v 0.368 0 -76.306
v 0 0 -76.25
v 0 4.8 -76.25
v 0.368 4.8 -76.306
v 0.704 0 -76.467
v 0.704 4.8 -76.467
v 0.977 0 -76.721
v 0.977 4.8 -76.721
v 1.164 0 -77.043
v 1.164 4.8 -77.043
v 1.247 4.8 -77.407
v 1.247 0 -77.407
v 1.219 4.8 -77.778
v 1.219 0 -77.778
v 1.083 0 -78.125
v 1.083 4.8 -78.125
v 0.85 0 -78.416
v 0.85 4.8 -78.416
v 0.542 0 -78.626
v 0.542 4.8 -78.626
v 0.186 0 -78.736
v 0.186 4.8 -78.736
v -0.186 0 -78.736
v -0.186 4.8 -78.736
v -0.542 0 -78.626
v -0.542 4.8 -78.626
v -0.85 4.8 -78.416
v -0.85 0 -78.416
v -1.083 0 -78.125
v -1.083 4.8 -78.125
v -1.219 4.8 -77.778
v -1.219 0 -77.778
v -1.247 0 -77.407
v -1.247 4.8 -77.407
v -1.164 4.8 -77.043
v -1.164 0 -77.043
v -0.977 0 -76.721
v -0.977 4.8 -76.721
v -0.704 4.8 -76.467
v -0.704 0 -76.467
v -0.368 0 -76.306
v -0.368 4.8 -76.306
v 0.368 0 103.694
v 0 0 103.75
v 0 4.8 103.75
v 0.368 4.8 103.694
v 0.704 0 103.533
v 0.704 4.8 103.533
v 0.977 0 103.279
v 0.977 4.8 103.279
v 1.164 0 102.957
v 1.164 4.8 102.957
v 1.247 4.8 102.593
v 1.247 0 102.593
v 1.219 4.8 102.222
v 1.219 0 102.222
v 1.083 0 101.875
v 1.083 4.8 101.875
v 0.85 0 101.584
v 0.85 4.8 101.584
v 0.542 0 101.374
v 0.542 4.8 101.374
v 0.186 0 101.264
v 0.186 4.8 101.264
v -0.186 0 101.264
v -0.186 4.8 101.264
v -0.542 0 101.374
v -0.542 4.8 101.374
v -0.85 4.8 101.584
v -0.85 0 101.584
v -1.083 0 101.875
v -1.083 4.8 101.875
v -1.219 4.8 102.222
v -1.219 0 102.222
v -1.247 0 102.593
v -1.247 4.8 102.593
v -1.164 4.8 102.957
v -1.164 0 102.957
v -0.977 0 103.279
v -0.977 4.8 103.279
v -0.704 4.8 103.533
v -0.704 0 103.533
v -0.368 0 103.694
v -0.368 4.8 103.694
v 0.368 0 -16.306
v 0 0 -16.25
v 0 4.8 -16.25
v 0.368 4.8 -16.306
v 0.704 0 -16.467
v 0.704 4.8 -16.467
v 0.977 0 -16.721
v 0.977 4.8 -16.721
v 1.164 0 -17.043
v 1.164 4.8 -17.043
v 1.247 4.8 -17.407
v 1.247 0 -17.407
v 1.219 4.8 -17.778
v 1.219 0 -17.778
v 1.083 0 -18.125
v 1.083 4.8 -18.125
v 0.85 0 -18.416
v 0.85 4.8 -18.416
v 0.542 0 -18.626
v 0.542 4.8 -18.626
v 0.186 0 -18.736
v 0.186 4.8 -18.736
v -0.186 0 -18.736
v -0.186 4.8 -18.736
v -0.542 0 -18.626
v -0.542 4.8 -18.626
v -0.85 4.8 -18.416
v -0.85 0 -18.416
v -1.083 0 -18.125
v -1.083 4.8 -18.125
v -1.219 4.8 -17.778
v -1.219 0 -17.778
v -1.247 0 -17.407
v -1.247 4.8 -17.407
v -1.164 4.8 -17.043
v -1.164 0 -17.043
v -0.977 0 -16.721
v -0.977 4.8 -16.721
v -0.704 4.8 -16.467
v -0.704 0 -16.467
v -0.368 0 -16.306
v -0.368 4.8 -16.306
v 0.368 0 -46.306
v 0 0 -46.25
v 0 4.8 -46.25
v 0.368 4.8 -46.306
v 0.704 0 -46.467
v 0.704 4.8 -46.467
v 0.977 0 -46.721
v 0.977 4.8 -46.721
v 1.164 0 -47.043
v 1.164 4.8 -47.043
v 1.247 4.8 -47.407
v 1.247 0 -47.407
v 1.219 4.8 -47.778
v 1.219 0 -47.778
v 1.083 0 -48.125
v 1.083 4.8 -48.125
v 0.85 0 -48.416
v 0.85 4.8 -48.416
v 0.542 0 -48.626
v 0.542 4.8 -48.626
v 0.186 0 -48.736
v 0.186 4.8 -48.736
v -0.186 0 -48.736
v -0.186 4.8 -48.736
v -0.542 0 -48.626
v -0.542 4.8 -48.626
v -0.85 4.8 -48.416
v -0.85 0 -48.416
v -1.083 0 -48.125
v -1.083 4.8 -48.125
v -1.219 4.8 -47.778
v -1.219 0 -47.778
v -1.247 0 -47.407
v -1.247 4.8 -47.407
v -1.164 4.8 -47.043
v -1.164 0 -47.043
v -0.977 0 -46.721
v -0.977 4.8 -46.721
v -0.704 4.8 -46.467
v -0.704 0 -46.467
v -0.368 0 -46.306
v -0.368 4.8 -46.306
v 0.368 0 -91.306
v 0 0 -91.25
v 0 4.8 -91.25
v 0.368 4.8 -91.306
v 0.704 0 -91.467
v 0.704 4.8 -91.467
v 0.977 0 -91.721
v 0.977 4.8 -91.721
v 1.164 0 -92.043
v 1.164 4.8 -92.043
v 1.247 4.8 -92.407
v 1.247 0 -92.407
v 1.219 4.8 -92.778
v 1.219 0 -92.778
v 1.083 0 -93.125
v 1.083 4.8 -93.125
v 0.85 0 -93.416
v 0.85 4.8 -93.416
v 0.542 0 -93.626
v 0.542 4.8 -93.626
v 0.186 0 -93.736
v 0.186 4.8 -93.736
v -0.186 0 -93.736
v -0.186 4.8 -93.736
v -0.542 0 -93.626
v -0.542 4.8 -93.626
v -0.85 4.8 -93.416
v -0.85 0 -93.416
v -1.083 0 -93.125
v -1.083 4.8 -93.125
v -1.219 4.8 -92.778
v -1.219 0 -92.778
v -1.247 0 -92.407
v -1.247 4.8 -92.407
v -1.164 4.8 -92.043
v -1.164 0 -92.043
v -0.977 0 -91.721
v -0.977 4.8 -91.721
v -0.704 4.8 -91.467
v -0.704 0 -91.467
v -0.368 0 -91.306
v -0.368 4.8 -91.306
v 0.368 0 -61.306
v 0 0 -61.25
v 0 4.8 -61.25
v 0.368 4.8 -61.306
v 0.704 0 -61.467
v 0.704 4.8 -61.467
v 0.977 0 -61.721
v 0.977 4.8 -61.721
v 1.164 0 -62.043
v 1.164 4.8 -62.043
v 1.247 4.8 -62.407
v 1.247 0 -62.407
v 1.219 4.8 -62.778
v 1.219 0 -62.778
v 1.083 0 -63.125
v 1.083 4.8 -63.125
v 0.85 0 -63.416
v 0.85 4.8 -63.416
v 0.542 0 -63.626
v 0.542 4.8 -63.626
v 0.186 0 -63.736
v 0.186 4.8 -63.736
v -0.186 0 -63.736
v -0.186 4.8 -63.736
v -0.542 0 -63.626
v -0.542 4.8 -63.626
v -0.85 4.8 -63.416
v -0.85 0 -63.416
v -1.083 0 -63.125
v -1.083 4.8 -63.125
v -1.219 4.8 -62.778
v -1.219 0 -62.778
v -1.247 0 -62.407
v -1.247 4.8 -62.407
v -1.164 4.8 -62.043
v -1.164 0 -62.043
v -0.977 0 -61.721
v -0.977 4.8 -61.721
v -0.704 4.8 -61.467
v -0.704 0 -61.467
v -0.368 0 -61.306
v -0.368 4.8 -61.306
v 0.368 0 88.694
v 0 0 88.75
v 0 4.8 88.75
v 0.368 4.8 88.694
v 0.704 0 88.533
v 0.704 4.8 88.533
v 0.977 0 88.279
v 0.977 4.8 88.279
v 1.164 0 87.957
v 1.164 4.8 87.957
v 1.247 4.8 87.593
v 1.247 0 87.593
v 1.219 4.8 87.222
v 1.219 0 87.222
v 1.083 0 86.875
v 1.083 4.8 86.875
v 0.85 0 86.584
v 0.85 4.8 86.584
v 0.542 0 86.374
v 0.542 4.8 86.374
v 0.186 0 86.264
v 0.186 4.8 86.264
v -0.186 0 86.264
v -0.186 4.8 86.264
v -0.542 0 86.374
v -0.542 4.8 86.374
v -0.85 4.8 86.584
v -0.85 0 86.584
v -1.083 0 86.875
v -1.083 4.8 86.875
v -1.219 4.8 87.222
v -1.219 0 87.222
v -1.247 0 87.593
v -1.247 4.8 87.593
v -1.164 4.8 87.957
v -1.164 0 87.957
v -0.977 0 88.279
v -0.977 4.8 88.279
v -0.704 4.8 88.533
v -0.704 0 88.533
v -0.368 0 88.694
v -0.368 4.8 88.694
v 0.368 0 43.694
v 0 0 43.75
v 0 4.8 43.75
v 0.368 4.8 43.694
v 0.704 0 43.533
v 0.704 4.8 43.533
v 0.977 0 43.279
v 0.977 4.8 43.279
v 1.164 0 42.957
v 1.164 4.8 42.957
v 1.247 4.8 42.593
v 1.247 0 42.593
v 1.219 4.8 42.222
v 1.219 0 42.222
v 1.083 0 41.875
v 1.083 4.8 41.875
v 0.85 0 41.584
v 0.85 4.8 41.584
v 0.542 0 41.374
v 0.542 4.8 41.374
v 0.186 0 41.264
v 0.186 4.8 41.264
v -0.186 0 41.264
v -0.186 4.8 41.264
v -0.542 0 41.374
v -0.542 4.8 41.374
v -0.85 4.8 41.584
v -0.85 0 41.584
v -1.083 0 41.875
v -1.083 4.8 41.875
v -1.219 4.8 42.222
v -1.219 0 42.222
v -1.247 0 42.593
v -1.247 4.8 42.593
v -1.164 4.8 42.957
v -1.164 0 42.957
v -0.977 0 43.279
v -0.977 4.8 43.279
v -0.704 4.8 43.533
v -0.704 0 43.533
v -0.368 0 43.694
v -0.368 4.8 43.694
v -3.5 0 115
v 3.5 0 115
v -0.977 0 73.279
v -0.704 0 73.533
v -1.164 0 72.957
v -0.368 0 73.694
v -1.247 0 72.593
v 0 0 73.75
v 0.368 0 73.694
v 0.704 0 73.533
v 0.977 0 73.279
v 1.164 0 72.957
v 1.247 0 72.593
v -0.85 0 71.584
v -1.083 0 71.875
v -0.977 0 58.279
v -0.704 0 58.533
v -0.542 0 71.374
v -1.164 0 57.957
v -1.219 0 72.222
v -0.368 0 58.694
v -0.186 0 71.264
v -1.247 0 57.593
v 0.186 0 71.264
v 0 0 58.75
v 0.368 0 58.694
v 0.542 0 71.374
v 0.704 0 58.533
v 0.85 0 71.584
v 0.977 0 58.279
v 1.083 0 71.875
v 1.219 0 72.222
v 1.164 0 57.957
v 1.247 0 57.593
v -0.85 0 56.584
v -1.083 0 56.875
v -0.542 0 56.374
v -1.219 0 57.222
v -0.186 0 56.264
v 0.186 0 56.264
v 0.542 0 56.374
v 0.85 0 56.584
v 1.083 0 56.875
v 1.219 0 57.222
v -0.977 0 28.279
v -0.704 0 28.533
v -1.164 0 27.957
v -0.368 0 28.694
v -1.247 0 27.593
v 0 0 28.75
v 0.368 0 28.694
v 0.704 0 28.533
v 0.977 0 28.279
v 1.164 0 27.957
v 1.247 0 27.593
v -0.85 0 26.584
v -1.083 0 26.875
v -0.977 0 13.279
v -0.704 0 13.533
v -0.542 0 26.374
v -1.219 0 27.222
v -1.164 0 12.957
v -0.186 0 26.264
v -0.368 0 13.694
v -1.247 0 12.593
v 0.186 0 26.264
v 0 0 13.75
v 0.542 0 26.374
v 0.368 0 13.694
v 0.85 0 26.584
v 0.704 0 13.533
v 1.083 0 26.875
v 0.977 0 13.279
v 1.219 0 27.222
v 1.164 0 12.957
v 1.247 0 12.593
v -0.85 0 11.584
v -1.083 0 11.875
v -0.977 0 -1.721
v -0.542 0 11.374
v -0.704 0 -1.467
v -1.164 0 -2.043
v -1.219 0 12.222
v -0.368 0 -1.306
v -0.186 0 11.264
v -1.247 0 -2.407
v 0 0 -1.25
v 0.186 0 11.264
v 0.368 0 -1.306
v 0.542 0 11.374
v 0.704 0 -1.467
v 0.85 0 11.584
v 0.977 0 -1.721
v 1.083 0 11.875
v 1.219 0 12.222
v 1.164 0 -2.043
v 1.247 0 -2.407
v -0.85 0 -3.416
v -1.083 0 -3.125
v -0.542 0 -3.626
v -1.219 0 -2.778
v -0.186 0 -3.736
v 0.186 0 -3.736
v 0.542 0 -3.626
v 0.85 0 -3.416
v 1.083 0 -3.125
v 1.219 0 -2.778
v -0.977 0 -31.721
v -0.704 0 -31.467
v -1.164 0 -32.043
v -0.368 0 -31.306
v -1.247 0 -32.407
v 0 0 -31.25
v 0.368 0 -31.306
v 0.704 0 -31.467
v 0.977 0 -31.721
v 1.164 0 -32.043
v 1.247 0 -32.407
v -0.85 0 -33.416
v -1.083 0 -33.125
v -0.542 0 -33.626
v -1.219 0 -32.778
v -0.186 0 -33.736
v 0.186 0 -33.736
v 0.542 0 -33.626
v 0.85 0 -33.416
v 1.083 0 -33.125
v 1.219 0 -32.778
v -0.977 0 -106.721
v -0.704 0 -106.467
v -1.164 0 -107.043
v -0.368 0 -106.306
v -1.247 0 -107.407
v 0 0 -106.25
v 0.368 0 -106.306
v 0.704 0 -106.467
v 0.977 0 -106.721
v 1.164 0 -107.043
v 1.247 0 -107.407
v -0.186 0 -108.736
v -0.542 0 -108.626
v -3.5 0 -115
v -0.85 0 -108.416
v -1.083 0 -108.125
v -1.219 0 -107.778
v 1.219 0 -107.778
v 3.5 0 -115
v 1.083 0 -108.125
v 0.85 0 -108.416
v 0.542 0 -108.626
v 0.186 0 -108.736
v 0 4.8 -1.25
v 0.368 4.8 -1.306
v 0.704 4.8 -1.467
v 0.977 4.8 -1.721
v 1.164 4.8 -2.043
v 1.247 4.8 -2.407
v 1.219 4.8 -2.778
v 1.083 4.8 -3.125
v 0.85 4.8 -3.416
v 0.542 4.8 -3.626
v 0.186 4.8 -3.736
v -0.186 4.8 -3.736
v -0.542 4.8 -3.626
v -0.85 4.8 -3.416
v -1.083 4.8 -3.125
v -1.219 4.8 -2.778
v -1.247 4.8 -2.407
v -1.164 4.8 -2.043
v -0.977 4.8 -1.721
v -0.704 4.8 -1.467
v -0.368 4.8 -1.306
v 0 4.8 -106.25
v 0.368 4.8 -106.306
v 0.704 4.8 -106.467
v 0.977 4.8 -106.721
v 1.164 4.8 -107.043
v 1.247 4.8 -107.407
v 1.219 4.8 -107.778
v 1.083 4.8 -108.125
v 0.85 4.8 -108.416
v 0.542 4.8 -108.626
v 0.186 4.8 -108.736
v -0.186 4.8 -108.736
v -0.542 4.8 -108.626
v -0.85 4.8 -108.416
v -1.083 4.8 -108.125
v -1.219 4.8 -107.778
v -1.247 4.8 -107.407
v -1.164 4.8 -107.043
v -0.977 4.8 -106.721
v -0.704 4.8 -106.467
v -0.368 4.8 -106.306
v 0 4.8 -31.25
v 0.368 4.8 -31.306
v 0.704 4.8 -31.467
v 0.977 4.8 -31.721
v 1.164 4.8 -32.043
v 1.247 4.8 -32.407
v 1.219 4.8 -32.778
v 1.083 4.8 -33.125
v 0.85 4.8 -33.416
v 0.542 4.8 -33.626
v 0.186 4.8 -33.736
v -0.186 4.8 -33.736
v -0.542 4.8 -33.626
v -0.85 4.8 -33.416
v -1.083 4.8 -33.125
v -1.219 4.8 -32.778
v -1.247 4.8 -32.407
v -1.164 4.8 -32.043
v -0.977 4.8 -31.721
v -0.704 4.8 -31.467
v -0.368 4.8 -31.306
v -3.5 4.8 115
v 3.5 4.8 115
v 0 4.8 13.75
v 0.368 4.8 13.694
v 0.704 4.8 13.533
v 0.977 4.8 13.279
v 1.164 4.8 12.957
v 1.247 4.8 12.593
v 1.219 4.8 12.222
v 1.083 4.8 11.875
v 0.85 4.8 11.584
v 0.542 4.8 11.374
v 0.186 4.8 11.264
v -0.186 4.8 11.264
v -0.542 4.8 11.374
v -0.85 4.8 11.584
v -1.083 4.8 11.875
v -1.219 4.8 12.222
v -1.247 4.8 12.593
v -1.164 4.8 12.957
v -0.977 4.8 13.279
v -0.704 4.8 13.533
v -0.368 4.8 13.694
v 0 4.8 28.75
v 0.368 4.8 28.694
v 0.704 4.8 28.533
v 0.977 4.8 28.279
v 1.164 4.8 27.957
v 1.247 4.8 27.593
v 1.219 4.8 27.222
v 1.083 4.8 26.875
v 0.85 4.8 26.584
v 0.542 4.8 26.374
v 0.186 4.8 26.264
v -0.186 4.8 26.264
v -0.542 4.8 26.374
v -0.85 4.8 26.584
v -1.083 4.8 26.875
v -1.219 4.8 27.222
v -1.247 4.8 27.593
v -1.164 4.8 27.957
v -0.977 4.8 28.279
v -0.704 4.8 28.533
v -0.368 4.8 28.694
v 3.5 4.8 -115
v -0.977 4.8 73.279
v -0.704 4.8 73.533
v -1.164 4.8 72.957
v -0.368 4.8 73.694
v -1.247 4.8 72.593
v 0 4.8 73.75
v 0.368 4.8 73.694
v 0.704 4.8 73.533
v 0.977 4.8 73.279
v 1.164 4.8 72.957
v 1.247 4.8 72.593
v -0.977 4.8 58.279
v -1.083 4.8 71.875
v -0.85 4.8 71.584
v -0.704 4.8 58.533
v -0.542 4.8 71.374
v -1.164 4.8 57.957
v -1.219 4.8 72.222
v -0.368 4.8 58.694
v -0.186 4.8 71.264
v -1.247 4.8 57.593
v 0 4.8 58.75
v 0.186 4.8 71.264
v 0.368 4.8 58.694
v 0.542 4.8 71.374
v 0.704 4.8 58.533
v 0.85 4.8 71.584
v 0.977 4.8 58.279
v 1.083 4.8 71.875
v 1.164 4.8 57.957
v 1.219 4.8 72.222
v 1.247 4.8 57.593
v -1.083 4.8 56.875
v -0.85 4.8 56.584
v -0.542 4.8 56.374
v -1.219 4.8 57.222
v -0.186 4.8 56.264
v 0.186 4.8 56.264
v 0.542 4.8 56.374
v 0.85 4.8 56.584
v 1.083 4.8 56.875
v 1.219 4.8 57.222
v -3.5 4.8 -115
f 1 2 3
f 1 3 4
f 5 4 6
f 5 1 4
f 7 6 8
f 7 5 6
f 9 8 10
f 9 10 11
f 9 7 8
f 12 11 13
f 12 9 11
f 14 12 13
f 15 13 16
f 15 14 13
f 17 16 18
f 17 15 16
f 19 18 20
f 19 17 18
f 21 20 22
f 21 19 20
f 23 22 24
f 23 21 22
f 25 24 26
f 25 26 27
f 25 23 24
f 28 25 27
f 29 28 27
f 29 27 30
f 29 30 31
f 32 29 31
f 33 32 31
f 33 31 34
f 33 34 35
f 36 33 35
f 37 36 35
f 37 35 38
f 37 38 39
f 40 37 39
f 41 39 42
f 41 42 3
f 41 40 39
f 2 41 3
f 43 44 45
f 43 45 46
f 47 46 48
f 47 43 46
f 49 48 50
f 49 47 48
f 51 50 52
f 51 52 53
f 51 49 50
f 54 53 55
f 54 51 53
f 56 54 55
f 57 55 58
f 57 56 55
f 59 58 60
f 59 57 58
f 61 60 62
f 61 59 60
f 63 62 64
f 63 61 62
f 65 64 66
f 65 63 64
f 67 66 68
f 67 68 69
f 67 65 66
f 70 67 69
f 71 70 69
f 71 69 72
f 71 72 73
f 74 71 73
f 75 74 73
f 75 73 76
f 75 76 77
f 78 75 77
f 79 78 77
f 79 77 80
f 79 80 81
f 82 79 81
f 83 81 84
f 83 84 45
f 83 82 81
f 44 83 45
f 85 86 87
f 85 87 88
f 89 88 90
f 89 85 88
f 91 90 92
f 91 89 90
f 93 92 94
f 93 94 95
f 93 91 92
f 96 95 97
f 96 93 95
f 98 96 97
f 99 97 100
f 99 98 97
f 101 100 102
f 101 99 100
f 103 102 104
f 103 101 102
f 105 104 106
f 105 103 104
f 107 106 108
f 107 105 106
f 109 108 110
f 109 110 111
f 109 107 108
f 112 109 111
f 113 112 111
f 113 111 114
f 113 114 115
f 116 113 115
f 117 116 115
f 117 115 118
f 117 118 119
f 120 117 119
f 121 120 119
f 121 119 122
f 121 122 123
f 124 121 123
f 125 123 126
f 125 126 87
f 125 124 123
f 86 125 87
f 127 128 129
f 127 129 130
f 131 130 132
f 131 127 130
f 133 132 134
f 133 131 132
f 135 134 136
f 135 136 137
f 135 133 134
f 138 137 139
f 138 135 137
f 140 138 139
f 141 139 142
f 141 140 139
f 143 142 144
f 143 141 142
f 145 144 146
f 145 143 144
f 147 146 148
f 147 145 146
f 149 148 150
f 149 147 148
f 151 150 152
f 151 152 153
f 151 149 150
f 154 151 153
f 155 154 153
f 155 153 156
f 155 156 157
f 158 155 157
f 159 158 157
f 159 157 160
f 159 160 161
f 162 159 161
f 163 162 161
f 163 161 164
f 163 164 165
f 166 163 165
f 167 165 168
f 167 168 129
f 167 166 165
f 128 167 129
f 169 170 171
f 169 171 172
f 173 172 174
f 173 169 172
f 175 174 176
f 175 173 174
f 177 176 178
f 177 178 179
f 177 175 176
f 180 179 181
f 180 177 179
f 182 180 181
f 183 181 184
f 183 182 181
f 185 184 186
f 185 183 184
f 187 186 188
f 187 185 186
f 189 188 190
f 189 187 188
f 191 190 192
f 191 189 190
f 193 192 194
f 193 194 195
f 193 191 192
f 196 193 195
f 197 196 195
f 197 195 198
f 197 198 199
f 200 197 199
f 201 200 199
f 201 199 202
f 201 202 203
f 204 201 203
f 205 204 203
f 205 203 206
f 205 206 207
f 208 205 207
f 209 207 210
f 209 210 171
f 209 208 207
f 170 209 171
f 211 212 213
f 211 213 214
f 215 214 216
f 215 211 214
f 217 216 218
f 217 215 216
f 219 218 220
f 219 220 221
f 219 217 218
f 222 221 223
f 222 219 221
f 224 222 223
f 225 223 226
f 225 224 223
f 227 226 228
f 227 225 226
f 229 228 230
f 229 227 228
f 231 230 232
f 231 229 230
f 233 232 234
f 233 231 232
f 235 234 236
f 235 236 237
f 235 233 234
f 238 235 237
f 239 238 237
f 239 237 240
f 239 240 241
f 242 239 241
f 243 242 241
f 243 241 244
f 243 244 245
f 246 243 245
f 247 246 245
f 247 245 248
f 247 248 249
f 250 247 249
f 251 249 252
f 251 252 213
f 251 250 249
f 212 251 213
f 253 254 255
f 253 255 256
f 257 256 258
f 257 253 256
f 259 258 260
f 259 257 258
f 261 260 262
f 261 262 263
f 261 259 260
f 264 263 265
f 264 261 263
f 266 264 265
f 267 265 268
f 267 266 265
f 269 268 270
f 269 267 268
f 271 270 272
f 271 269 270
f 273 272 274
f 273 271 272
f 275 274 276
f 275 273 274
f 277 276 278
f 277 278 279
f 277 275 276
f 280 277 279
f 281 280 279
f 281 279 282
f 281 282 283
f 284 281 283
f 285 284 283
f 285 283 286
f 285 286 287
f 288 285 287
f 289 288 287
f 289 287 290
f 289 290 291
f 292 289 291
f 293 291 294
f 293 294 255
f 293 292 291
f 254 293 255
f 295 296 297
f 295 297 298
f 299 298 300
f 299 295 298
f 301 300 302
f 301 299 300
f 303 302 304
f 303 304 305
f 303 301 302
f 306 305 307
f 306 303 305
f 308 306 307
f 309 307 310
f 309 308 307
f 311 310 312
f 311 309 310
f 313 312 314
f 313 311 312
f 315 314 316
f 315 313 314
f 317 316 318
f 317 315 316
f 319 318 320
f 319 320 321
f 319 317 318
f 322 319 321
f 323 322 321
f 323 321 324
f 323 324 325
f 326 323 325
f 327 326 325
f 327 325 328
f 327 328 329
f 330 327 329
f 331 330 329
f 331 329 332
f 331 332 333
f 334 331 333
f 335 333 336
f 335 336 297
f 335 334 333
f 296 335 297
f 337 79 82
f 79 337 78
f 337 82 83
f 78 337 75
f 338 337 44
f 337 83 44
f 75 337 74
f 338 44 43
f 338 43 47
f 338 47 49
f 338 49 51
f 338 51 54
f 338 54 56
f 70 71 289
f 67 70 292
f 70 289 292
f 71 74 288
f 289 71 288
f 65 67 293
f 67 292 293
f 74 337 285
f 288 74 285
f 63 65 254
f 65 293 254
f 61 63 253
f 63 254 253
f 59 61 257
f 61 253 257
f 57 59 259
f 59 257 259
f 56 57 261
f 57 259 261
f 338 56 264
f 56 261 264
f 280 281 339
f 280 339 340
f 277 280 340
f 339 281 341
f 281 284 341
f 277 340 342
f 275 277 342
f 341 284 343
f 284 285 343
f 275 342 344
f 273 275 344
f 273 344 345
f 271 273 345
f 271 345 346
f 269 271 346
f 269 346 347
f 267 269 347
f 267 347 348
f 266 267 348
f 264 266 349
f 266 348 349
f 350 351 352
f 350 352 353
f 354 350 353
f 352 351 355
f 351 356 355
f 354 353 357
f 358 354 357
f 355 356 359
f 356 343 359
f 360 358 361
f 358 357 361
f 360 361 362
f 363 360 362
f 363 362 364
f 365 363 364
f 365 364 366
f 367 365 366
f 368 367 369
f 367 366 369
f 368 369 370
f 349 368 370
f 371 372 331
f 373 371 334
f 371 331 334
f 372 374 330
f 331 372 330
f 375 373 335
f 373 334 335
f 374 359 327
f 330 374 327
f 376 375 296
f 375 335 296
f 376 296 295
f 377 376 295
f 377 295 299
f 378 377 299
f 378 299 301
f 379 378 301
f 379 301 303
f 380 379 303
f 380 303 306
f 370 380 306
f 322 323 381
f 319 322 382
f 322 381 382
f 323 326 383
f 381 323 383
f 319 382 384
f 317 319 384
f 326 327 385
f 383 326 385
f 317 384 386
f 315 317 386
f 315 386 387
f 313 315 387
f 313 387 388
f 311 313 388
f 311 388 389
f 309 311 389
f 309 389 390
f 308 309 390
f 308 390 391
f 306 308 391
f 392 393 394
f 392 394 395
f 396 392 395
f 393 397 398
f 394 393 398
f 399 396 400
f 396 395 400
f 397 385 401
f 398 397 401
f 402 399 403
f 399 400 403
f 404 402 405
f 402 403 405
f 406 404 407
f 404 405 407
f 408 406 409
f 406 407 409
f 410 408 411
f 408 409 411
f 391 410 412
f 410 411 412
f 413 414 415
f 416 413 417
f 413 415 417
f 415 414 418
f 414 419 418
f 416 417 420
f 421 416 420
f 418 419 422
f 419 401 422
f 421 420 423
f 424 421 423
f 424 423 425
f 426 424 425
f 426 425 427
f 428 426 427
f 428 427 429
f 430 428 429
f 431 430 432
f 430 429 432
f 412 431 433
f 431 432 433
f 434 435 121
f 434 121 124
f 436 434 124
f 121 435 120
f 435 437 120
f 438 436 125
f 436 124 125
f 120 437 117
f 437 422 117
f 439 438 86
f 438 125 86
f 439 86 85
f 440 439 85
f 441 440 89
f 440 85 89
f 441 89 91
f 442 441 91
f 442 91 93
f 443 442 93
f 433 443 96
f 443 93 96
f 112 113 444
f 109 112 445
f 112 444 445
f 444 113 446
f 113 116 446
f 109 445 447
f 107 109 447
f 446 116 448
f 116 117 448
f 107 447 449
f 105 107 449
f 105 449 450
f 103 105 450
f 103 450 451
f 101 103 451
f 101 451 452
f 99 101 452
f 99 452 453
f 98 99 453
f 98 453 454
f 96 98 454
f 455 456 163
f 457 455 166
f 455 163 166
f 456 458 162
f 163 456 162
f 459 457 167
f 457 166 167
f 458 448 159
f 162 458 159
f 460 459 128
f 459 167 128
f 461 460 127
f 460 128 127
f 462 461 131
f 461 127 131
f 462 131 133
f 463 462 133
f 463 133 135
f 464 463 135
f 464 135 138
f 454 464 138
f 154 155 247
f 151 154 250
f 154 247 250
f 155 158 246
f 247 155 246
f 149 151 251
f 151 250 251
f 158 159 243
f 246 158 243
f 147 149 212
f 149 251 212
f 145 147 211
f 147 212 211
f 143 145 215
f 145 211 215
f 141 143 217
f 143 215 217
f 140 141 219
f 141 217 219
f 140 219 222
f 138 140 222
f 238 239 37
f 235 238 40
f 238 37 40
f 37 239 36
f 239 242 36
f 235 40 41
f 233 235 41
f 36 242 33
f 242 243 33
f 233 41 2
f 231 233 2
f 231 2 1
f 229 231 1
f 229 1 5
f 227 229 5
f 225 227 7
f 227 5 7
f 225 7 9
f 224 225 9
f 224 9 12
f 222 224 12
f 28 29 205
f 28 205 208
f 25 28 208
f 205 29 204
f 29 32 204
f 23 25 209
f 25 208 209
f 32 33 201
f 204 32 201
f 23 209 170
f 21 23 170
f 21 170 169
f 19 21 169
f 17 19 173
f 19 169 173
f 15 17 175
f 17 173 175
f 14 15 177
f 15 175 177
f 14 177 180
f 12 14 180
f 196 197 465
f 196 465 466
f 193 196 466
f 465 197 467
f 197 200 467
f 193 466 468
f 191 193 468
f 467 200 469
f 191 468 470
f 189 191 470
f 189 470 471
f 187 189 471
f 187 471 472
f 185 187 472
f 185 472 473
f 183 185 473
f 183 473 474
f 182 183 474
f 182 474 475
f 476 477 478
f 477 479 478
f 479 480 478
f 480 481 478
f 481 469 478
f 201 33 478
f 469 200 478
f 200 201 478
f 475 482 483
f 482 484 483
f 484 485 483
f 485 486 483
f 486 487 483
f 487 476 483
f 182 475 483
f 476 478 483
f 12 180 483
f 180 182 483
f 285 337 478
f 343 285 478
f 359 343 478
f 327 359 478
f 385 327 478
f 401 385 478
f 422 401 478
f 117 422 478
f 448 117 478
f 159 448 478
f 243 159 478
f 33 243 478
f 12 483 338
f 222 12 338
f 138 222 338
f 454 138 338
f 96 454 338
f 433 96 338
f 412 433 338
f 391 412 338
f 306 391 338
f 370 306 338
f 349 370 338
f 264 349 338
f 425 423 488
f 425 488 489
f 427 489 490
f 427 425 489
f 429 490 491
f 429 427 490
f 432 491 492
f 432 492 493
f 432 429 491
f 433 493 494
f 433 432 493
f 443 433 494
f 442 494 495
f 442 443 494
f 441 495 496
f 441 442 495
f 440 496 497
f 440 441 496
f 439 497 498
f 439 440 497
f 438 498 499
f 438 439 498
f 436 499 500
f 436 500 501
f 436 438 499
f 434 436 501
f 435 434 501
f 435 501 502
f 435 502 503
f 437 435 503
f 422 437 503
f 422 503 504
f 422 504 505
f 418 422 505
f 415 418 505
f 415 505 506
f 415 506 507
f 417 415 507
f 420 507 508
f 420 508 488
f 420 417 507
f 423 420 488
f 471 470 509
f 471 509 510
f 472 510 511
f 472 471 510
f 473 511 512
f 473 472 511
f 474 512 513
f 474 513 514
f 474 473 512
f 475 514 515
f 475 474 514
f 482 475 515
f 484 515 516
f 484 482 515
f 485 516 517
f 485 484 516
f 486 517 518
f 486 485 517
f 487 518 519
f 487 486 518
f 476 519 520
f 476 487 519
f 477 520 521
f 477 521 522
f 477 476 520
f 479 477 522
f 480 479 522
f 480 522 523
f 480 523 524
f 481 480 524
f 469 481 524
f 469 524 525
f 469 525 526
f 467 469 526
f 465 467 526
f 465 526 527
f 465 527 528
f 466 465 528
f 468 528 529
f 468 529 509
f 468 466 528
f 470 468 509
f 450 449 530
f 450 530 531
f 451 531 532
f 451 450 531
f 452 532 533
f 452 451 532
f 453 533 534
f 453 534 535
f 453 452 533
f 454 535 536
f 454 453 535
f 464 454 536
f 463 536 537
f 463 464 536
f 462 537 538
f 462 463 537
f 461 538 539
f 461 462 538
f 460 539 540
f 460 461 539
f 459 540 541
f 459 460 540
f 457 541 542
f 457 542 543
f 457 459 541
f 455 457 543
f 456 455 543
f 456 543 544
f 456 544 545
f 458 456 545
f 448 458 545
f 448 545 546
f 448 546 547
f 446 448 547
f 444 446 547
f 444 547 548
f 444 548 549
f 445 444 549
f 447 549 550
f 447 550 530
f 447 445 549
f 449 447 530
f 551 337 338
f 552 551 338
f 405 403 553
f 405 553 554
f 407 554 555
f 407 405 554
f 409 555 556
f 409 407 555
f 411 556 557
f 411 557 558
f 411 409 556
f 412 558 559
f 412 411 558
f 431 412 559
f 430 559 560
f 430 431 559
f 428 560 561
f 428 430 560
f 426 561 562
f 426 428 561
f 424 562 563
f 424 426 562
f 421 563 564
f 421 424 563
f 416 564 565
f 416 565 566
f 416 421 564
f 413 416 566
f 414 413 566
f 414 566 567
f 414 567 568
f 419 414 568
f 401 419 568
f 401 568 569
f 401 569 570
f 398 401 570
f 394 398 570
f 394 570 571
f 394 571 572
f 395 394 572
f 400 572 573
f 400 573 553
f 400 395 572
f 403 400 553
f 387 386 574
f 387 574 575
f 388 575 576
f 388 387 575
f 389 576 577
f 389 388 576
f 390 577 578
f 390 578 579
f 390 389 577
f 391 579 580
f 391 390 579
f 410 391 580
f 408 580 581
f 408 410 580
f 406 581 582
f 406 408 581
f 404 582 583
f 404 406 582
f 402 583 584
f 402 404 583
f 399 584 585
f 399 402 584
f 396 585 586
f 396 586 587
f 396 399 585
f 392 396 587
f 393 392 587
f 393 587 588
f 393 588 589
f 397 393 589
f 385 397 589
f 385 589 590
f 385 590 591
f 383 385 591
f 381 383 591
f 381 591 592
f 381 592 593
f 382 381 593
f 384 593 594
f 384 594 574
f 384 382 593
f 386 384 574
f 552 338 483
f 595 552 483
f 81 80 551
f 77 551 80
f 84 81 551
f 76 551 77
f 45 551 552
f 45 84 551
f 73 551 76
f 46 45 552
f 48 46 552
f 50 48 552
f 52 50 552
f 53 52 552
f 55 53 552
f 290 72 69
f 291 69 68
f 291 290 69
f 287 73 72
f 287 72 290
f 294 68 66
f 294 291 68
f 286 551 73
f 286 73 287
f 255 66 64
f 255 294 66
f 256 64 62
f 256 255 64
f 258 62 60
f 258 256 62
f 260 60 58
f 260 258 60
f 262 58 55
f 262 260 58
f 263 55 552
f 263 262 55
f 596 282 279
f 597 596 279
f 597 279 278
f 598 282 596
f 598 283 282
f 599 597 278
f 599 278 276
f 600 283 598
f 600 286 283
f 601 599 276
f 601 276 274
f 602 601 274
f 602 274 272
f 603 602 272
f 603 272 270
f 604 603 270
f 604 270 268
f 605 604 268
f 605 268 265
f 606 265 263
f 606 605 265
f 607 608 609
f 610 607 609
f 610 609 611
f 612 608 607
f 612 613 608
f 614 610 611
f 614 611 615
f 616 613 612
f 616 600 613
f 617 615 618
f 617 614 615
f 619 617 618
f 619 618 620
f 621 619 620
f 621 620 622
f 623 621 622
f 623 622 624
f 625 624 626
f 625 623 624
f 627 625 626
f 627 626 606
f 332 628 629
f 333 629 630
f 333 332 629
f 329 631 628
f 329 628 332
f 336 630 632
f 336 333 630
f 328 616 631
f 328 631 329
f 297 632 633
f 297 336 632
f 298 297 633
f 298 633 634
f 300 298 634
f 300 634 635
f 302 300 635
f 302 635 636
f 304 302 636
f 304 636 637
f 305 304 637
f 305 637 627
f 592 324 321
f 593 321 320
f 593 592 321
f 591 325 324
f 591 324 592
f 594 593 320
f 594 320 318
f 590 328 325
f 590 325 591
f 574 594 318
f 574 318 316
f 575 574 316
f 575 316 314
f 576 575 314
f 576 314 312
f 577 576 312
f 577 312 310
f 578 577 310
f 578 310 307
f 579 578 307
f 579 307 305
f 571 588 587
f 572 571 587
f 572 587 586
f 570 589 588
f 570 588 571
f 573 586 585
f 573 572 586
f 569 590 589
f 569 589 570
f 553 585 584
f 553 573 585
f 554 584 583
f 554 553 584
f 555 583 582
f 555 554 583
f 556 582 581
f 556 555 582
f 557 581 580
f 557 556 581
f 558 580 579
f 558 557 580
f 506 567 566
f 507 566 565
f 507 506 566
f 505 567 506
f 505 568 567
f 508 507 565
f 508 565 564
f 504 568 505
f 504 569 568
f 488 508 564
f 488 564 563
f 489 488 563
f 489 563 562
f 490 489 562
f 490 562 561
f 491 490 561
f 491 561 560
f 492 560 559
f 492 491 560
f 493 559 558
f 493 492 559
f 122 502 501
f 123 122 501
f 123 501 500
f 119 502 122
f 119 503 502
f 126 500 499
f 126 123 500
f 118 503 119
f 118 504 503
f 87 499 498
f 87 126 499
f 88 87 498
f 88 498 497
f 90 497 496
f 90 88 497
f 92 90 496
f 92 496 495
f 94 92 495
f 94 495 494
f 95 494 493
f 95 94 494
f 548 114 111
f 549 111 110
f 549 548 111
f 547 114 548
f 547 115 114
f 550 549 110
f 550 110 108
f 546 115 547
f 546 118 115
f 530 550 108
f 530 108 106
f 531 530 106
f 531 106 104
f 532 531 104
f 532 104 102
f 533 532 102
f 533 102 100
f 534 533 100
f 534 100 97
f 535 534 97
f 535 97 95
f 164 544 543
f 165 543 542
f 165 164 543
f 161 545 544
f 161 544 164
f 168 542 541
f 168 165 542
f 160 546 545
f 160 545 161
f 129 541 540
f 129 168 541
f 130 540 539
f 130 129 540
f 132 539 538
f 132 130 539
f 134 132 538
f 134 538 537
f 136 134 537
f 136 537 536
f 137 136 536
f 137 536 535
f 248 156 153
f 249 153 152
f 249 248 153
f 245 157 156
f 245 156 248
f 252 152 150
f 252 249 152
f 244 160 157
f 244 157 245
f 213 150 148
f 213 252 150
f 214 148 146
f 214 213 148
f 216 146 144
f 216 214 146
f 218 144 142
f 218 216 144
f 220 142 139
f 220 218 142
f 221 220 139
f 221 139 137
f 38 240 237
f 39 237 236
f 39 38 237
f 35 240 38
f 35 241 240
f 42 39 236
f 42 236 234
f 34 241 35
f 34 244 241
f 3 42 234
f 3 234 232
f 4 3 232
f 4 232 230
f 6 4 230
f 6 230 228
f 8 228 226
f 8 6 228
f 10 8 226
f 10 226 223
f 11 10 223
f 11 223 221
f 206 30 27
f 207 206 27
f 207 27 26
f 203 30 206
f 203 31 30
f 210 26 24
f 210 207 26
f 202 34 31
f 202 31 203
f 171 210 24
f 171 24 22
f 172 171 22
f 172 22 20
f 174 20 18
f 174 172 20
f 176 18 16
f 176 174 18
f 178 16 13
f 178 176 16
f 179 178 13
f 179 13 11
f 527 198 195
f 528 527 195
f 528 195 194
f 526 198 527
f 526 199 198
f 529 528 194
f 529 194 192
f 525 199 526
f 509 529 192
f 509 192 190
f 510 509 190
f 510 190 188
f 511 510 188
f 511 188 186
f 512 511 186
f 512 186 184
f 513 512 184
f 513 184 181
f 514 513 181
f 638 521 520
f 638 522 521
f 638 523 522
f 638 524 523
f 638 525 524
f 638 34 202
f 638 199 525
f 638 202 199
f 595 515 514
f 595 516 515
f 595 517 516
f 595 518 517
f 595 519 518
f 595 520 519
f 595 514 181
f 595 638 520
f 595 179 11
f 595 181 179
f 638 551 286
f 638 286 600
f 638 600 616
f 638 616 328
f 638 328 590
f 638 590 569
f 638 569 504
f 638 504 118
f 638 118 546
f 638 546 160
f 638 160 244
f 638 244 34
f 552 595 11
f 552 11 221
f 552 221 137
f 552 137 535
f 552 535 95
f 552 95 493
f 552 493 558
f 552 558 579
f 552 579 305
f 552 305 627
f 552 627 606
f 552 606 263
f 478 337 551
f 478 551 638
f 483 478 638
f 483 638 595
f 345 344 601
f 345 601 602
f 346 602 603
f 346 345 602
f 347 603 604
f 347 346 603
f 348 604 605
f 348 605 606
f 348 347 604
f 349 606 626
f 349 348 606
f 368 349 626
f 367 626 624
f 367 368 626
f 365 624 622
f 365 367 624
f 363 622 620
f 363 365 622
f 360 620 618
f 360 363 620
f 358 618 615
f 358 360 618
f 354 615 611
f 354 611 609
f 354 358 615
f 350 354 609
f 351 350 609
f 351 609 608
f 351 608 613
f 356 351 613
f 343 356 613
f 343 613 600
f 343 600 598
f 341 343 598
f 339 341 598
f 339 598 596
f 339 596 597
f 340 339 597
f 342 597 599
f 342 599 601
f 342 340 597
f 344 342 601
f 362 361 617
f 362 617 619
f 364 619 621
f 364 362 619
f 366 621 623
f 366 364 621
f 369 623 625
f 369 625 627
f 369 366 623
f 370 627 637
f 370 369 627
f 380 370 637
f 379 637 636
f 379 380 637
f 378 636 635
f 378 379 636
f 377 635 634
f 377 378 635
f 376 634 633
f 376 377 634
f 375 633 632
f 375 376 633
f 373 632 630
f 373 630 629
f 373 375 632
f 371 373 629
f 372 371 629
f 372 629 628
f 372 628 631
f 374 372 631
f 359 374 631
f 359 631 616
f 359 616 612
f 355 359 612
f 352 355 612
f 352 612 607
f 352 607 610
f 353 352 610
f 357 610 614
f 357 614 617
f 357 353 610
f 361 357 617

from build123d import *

# Parameters (mm, degrees)
SKETCH_1_W      = 7
SKETCH_1_H      = 230
SKETCH_1_R      = 1.25
EXTRUDE_1_DEPTH = 4.8


with BuildPart() as part:
    # 草图1 → 凸台-拉伸1 (new body)
    with BuildSketch(Plane(origin=(0, 0, 0), x_dir=(1, 0, 0), z_dir=(0, 1, 0))):
        Rectangle(SKETCH_1_W, SKETCH_1_H)
        with Locations(Location((0, 107.5, 0), (0, 0, 270))):
            Circle(SKETCH_1_R, mode=Mode.SUBTRACT)
        with Locations(Location((0, 92.5, 0), (0, 0, 270))):
            Circle(SKETCH_1_R, mode=Mode.SUBTRACT)
        with Locations(Location((0, 77.5, 0), (0, 0, 270))):
            Circle(SKETCH_1_R, mode=Mode.SUBTRACT)
        with Locations(Location((0, 62.5, 0), (0, 0, 270))):
            Circle(SKETCH_1_R, mode=Mode.SUBTRACT)
        with Locations(Location((0, 47.5, 0), (0, 0, 270))):
            Circle(SKETCH_1_R, mode=Mode.SUBTRACT)
        with Locations(Location((0, 32.5, 0), (0, 0, 270))):
            Circle(SKETCH_1_R, mode=Mode.SUBTRACT)
        with Locations(Location((0, 17.5, 0), (0, 0, 270))):
            Circle(SKETCH_1_R, mode=Mode.SUBTRACT)
        with Locations(Location((0, 2.5, 0), (0, 0, 270))):
            Circle(SKETCH_1_R, mode=Mode.SUBTRACT)
        with Locations(Location((0, -12.5, 0), (0, 0, 270))):
            Circle(SKETCH_1_R, mode=Mode.SUBTRACT)
        with Locations(Location((0, -27.5, 0), (0, 0, 270))):
            Circle(SKETCH_1_R, mode=Mode.SUBTRACT)
        with Locations(Location((0, -42.5, 0), (0, 0, 270))):
            Circle(SKETCH_1_R, mode=Mode.SUBTRACT)
        with Locations(Location((0, -57.5, 0), (0, 0, 270))):
            Circle(SKETCH_1_R, mode=Mode.SUBTRACT)
        with Locations(Location((0, -72.5, 0), (0, 0, 270))):
            Circle(SKETCH_1_R, mode=Mode.SUBTRACT)
        with Locations(Location((0, -87.5, 0), (0, 0, 270))):
            Circle(SKETCH_1_R, mode=Mode.SUBTRACT)
        with Locations(Location((0, -102.5, 0), (0, 0, 270))):
            Circle(SKETCH_1_R, mode=Mode.SUBTRACT)
    extrude(amount=EXTRUDE_1_DEPTH)


solid = part.part
